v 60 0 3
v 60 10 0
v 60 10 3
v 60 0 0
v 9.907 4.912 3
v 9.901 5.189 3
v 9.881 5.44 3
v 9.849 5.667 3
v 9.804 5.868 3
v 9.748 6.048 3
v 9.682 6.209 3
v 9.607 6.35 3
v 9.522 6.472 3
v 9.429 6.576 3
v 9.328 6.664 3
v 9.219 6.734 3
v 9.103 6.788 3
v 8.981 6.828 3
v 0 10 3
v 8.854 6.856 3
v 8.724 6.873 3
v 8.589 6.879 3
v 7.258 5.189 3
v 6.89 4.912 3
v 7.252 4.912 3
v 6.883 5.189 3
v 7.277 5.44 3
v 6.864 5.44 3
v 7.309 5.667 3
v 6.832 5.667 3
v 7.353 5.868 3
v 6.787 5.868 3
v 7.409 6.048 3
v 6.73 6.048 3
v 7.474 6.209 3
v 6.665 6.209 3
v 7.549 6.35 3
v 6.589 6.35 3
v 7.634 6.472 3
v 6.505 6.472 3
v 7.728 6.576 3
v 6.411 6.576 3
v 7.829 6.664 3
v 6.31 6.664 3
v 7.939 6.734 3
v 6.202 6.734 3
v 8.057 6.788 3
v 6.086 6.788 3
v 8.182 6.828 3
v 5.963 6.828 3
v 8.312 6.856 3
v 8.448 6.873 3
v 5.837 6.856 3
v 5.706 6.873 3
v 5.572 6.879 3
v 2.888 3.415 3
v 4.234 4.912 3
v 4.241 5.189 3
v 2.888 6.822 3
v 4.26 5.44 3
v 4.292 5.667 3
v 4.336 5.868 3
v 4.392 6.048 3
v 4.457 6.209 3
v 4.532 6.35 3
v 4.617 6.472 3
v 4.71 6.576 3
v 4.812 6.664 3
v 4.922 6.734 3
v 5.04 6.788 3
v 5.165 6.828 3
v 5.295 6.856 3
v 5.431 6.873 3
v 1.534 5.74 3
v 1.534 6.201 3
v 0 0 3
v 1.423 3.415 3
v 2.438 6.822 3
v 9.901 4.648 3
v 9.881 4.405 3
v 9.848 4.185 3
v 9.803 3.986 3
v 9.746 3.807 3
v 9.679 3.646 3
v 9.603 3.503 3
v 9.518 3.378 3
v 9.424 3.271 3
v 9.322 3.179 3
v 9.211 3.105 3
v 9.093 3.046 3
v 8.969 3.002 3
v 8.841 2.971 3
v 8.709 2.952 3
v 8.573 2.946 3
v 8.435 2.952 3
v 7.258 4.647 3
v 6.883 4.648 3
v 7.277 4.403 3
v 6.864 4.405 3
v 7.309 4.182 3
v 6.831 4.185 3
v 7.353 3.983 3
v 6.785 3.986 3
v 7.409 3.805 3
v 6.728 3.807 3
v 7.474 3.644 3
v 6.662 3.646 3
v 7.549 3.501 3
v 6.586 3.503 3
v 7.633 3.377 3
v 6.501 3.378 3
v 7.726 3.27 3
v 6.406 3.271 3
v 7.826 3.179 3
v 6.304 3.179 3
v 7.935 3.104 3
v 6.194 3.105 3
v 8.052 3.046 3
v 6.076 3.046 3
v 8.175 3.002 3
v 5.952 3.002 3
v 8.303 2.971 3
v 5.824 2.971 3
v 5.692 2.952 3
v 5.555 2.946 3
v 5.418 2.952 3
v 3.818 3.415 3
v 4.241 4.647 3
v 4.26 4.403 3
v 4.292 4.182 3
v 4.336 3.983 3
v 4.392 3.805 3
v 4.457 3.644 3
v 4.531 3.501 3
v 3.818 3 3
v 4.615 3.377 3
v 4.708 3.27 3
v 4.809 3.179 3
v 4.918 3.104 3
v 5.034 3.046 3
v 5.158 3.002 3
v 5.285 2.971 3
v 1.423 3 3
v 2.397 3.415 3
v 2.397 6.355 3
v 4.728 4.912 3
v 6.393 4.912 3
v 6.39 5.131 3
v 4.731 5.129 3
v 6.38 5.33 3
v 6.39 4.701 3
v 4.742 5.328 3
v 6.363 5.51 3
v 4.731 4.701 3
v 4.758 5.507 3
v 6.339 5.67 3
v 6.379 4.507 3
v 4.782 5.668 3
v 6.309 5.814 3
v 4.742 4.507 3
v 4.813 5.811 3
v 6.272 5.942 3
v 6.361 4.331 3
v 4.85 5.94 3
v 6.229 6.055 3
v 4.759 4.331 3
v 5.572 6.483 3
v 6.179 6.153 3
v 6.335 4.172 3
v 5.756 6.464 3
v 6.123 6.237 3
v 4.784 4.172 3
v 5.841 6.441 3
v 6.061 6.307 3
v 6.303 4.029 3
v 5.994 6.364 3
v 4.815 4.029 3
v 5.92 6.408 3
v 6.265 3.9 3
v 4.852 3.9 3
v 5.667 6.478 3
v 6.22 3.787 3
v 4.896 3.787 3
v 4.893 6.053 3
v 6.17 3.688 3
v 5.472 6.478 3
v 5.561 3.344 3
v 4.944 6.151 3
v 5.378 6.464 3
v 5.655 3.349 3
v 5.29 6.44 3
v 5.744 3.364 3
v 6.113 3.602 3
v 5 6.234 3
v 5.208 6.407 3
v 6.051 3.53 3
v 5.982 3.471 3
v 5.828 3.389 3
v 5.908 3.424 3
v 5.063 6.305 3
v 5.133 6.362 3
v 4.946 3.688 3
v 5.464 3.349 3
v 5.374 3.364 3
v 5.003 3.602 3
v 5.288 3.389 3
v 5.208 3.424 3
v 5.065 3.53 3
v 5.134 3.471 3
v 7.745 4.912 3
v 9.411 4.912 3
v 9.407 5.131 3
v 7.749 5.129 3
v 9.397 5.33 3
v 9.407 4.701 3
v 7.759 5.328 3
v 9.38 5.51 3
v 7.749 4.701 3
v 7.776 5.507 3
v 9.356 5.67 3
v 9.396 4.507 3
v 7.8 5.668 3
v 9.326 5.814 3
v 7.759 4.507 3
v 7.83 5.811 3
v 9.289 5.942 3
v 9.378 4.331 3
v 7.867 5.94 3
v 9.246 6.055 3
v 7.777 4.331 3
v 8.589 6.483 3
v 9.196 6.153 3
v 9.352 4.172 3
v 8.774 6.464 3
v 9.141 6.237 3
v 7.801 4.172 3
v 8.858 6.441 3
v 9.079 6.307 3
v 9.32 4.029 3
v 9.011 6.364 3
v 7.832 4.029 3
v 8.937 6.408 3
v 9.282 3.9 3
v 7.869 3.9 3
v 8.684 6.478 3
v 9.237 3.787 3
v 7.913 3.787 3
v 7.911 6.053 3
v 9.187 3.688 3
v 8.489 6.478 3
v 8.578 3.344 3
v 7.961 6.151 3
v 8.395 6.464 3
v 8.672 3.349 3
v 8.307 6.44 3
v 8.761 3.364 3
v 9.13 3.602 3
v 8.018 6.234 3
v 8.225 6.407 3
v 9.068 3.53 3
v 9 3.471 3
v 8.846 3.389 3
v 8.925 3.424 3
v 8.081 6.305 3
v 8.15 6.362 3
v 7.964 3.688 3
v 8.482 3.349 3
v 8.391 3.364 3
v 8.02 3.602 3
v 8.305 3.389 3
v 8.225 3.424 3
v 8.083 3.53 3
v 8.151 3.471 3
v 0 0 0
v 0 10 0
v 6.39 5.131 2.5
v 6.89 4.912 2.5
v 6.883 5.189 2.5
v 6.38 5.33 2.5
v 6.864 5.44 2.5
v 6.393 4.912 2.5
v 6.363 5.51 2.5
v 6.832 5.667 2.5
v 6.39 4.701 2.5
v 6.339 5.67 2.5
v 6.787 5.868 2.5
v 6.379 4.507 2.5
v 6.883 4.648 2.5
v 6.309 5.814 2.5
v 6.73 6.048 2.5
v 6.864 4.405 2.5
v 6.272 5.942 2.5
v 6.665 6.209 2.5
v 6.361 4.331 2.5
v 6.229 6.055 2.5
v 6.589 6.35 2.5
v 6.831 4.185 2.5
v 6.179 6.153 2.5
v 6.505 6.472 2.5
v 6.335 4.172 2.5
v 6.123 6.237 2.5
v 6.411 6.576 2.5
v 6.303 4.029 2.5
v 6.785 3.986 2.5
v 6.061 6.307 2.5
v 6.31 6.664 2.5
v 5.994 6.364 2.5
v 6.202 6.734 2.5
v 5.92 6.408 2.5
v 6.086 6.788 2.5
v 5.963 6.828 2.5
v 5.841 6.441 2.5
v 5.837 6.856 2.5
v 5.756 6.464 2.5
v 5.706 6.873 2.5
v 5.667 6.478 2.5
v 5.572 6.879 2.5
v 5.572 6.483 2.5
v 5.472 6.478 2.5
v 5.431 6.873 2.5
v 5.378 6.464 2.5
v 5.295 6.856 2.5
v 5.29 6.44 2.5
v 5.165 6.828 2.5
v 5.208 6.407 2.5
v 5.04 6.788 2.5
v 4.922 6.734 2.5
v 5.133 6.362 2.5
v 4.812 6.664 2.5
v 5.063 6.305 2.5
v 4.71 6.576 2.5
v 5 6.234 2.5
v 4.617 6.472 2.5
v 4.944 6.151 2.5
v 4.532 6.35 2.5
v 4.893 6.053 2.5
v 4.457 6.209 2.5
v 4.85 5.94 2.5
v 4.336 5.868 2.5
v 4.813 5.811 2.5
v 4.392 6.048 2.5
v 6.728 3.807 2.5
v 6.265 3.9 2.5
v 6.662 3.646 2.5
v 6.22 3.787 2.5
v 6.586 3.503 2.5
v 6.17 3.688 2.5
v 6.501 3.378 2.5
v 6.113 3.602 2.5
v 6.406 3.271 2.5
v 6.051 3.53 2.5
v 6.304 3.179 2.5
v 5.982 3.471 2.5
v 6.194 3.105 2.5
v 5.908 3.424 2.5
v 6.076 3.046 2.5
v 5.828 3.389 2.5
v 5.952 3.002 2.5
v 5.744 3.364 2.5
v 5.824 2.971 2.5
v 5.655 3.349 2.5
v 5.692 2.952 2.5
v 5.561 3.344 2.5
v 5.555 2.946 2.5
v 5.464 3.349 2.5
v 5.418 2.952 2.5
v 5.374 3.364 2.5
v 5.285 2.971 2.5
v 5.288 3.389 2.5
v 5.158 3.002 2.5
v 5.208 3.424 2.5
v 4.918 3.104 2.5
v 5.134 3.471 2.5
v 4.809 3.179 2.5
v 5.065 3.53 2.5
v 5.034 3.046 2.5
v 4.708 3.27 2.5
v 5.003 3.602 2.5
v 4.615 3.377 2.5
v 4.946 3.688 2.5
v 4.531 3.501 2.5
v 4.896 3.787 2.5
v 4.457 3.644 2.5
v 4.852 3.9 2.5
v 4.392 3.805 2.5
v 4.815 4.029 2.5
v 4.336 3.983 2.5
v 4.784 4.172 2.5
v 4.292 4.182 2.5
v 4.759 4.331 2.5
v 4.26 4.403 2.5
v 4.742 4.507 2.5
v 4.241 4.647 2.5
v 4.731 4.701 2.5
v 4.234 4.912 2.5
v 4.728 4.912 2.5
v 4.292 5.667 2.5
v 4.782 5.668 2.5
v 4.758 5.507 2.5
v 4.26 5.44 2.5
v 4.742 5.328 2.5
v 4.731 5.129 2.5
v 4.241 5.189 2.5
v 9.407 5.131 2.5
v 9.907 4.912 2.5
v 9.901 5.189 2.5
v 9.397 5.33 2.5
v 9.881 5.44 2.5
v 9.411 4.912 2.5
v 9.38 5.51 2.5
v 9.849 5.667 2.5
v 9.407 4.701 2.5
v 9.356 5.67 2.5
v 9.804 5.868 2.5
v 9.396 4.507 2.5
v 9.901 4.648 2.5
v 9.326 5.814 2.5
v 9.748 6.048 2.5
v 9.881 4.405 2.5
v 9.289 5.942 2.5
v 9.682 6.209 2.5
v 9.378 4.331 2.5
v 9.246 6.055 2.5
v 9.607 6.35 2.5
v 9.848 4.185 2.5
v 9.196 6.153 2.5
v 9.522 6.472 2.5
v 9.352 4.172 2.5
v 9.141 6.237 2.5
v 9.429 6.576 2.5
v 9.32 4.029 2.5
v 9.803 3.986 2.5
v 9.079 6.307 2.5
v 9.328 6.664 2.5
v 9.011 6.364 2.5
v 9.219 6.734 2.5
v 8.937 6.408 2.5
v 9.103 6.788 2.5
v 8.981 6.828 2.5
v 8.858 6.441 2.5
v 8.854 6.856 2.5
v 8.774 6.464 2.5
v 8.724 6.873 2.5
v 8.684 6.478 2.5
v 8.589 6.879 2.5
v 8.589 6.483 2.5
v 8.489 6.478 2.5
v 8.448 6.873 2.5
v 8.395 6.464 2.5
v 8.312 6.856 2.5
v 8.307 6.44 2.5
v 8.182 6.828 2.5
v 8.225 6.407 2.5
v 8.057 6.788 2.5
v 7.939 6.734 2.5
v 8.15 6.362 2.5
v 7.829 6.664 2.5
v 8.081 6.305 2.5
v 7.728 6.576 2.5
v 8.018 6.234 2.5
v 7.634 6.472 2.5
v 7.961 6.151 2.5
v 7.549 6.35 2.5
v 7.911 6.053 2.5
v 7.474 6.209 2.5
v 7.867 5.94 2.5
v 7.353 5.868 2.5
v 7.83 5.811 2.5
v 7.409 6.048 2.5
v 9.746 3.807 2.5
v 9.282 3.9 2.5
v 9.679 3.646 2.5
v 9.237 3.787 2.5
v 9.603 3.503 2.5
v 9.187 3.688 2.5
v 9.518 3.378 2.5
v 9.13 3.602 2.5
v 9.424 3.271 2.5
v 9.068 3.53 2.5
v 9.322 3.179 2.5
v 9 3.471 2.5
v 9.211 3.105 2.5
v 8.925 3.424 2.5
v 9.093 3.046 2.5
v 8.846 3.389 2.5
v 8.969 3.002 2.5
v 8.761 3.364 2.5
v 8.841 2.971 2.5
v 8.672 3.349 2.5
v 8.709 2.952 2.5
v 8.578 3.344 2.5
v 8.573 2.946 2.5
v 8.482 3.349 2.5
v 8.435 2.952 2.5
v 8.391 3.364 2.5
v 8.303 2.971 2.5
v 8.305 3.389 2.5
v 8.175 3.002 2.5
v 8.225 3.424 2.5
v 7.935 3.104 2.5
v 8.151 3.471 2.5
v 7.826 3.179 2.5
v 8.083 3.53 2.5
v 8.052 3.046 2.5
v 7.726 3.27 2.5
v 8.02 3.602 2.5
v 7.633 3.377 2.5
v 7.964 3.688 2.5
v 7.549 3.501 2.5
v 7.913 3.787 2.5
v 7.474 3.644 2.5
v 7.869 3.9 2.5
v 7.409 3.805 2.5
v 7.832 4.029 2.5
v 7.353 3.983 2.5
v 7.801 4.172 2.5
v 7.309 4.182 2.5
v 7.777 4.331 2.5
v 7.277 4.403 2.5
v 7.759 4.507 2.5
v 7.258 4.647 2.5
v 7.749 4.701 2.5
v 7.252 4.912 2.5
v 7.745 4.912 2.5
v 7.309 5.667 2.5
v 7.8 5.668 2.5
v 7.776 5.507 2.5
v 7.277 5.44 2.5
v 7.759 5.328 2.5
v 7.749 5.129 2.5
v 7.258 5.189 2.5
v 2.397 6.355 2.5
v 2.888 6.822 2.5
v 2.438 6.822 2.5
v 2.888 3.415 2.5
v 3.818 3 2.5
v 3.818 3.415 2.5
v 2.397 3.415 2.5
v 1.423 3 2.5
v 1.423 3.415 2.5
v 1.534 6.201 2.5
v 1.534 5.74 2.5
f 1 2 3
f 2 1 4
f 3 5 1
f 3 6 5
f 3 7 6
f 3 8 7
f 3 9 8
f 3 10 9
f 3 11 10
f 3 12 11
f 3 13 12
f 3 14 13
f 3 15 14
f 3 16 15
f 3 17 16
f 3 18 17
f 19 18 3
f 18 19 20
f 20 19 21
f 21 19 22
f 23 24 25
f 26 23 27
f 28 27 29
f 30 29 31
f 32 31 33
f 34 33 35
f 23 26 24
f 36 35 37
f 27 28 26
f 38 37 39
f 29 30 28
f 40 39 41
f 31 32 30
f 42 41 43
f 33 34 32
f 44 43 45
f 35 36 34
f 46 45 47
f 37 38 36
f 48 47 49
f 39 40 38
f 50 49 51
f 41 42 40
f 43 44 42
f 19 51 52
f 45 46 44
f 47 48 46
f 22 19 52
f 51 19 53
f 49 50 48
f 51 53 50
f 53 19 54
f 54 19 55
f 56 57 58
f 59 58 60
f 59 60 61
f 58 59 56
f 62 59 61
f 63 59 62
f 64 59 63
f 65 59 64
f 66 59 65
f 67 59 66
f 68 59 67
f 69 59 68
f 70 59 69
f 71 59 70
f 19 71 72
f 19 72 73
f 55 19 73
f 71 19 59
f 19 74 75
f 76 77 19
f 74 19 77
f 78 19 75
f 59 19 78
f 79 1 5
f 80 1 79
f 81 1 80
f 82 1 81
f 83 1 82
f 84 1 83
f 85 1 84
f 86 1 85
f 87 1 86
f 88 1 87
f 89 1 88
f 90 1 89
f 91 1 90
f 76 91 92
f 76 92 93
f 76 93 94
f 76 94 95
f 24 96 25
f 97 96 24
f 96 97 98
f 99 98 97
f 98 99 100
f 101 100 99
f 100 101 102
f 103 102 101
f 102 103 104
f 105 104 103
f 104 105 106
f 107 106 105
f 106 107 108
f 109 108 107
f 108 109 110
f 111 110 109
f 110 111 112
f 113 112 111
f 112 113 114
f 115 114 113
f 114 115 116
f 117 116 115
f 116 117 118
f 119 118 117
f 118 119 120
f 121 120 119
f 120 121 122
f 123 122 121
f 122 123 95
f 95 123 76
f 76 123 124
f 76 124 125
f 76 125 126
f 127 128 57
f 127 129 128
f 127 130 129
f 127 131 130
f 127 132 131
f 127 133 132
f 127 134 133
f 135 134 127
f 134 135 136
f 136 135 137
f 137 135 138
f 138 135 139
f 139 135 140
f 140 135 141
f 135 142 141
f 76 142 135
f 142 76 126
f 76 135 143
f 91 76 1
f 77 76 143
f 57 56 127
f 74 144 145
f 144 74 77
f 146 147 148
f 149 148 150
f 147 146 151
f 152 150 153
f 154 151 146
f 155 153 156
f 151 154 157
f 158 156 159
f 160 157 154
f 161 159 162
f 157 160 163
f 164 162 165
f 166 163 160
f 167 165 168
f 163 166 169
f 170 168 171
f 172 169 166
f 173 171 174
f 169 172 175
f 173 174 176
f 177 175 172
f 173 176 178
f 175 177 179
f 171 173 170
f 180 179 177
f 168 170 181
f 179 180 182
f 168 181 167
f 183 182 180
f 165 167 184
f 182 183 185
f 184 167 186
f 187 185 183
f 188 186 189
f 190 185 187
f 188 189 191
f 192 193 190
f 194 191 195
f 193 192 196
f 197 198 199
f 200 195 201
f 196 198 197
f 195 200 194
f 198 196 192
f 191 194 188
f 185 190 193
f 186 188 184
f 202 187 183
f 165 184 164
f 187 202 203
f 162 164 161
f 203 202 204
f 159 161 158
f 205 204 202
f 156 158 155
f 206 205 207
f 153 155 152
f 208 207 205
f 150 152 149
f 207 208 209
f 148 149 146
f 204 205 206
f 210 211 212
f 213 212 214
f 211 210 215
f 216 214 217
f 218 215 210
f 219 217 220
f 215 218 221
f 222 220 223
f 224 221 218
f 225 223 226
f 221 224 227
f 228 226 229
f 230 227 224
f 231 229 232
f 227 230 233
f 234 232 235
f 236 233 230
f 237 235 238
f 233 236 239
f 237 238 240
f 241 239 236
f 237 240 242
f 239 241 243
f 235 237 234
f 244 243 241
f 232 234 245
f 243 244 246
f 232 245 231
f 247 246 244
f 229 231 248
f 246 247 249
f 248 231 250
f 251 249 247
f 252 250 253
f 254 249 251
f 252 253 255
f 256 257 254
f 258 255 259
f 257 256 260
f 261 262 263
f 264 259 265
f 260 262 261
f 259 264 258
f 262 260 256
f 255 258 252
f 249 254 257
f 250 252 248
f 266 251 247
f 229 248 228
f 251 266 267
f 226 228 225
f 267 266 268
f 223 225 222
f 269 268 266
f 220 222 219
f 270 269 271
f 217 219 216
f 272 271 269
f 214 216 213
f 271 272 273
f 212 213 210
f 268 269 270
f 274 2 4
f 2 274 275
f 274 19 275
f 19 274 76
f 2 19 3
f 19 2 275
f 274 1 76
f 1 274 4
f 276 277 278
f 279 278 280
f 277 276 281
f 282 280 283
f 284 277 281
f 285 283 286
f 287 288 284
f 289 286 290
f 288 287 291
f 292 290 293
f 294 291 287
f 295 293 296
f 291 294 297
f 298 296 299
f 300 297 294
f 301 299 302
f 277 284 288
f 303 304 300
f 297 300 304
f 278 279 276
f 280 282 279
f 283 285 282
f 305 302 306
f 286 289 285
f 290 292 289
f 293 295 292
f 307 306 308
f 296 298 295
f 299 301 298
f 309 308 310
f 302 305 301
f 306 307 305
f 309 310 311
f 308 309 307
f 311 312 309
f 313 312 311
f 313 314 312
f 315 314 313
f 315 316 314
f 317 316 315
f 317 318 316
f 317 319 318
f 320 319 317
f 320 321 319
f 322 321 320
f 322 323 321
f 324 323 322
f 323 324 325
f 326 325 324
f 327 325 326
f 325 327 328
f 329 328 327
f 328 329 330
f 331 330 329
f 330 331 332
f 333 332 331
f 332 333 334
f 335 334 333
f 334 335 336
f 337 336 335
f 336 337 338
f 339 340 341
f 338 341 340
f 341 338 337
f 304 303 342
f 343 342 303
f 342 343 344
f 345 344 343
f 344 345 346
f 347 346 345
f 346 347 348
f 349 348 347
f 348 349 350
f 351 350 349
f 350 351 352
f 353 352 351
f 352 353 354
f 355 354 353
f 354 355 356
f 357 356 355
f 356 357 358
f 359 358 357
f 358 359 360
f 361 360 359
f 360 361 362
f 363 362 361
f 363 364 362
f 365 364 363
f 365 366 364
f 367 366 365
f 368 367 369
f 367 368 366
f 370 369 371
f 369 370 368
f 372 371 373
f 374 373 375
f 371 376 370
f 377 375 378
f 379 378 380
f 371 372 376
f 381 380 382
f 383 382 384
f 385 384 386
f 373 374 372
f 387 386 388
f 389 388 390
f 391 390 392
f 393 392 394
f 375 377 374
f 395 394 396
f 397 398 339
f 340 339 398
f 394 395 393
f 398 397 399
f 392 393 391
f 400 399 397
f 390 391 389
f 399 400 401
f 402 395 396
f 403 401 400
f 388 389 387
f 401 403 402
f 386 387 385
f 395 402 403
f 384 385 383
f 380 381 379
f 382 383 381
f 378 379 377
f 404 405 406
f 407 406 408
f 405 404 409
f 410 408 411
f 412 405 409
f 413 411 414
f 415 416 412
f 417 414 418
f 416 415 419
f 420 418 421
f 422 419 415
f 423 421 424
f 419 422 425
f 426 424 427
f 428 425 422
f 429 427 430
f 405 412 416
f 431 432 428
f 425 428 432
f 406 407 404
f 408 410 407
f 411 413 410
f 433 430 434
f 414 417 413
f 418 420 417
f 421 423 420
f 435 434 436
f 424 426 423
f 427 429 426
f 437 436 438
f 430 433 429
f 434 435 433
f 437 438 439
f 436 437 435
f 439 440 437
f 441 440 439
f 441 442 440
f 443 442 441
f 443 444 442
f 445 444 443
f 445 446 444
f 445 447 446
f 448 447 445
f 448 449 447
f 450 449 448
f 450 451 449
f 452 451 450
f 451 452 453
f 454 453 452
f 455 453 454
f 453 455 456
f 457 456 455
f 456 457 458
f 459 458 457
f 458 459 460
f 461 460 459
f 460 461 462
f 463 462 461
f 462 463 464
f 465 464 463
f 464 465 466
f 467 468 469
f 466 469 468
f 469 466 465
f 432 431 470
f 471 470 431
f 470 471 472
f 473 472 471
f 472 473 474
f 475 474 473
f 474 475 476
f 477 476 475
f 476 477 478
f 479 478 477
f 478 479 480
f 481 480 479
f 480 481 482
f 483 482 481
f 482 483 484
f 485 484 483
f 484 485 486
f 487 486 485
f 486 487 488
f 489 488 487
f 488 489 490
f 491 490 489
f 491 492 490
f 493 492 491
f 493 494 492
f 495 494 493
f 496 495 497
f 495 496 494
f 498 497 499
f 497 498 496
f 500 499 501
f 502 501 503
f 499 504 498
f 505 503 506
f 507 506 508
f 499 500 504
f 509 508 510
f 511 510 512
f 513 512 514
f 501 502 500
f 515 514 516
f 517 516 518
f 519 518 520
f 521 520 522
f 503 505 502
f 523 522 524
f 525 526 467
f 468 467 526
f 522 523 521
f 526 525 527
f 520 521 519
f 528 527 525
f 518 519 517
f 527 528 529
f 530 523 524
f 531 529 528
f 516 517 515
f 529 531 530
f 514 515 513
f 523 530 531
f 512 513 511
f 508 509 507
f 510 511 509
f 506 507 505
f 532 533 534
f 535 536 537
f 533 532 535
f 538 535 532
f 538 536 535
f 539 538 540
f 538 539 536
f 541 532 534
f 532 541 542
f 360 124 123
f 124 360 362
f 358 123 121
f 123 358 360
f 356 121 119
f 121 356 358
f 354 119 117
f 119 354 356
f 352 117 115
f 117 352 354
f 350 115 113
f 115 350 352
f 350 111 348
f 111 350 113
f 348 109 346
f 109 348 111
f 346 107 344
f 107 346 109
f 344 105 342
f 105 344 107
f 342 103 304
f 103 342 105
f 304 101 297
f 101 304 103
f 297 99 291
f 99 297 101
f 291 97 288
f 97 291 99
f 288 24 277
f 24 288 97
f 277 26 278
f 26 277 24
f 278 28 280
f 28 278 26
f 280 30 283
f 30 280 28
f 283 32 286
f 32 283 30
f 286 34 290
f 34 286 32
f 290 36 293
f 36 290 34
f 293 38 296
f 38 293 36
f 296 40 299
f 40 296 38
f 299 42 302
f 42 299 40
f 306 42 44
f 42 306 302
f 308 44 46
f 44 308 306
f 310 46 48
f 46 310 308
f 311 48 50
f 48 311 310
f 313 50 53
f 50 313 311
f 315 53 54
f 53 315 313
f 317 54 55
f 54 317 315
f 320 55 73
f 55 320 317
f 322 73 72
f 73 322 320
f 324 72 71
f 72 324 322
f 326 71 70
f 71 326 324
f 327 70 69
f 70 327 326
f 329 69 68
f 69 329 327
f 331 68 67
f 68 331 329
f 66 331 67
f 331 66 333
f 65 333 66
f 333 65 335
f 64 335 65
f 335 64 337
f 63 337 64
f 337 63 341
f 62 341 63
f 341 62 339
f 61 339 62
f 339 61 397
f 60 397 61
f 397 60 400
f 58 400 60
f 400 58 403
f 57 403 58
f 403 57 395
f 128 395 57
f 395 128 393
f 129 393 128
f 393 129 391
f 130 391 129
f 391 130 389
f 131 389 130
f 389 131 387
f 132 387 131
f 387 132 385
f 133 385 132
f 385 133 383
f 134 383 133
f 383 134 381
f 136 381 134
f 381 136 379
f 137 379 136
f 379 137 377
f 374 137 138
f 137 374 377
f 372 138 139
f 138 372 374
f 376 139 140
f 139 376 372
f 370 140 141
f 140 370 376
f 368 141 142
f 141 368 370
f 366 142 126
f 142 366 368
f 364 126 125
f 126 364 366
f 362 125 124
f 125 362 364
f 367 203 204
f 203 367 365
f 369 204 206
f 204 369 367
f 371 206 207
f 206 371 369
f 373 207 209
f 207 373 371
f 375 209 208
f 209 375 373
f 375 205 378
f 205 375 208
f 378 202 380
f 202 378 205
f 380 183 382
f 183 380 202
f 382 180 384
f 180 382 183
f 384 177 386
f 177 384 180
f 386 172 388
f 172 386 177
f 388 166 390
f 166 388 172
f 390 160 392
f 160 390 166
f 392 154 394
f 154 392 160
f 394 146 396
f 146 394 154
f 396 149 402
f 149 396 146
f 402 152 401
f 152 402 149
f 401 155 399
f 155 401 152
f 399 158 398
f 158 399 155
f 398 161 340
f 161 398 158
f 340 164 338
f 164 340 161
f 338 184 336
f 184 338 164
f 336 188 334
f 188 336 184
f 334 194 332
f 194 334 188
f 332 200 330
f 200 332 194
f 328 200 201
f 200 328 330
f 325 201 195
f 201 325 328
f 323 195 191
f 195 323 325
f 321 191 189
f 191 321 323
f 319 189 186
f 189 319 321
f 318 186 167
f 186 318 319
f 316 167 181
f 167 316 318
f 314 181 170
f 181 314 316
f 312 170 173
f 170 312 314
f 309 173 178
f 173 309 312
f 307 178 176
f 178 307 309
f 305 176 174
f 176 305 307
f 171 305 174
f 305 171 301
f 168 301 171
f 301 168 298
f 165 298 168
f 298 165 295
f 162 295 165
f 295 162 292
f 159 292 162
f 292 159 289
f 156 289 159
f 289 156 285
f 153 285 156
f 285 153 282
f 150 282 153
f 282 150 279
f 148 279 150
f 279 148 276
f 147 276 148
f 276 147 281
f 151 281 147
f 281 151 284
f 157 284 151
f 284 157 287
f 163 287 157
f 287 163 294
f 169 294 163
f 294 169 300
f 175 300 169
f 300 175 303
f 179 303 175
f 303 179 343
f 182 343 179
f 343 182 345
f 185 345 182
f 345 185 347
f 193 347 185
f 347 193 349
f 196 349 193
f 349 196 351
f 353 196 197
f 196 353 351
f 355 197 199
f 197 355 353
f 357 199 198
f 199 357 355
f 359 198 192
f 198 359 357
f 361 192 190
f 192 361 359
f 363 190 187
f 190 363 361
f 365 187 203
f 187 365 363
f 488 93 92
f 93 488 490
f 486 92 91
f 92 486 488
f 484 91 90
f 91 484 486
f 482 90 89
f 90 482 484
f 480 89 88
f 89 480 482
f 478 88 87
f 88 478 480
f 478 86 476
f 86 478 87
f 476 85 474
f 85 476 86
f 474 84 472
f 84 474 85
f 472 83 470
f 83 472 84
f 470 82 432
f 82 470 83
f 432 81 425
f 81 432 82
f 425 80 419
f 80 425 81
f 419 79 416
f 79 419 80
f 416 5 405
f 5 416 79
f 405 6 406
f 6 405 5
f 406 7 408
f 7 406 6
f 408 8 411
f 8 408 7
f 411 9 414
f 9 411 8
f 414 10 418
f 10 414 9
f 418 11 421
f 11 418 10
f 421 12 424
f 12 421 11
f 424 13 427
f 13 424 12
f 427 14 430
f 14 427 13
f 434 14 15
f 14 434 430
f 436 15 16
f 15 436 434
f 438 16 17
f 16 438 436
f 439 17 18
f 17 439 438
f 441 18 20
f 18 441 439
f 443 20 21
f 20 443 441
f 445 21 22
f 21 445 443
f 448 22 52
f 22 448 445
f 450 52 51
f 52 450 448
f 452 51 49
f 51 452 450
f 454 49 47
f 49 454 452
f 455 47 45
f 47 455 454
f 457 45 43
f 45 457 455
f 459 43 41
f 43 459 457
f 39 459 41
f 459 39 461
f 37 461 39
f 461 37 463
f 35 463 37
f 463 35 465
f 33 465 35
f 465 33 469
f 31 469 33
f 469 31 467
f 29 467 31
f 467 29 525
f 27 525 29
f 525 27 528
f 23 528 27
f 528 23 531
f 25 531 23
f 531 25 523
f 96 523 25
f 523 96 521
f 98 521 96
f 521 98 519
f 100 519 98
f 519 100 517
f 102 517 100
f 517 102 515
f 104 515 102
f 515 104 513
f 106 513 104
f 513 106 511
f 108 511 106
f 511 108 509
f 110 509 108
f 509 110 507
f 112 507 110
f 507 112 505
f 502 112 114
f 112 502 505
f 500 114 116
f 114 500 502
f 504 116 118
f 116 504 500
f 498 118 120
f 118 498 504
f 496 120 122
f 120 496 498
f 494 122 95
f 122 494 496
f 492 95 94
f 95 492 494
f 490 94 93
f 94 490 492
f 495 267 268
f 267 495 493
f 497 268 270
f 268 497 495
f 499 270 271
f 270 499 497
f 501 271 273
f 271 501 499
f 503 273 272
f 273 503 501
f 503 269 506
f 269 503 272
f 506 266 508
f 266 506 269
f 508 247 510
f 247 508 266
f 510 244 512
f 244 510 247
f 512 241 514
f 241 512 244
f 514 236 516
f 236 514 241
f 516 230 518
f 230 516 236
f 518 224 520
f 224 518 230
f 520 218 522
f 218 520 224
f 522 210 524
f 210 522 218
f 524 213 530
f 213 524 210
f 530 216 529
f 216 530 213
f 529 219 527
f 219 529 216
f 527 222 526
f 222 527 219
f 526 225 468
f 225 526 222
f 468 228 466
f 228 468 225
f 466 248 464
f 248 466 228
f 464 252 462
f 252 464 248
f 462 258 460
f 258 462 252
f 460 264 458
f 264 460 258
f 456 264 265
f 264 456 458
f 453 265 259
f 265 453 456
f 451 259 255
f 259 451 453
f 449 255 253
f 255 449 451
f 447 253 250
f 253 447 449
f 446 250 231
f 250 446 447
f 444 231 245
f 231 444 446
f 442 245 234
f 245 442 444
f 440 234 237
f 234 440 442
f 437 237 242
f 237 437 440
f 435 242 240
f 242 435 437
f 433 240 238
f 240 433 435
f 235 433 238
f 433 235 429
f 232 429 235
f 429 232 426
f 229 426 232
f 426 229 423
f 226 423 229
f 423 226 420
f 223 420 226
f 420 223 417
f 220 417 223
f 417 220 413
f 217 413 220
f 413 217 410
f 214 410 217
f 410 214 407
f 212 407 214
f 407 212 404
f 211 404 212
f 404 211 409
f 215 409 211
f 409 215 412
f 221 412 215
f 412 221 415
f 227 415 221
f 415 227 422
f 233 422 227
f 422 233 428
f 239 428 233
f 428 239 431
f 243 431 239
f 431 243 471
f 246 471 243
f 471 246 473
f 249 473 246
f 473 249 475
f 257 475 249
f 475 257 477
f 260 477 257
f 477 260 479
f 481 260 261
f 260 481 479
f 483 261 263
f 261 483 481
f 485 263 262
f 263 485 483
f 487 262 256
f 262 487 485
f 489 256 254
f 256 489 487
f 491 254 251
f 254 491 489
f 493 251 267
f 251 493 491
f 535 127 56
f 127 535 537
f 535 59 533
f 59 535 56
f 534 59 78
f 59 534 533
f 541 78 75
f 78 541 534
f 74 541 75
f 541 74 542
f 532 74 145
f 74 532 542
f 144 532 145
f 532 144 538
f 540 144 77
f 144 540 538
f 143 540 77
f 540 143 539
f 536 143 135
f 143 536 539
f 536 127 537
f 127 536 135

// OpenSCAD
$fn = 25;

difference() {
  cube([60, 10, 3]);
  translate([1, 3, 2.5])
  linear_extrude(height = 1) {
    text("100", size=4);
  }
}
